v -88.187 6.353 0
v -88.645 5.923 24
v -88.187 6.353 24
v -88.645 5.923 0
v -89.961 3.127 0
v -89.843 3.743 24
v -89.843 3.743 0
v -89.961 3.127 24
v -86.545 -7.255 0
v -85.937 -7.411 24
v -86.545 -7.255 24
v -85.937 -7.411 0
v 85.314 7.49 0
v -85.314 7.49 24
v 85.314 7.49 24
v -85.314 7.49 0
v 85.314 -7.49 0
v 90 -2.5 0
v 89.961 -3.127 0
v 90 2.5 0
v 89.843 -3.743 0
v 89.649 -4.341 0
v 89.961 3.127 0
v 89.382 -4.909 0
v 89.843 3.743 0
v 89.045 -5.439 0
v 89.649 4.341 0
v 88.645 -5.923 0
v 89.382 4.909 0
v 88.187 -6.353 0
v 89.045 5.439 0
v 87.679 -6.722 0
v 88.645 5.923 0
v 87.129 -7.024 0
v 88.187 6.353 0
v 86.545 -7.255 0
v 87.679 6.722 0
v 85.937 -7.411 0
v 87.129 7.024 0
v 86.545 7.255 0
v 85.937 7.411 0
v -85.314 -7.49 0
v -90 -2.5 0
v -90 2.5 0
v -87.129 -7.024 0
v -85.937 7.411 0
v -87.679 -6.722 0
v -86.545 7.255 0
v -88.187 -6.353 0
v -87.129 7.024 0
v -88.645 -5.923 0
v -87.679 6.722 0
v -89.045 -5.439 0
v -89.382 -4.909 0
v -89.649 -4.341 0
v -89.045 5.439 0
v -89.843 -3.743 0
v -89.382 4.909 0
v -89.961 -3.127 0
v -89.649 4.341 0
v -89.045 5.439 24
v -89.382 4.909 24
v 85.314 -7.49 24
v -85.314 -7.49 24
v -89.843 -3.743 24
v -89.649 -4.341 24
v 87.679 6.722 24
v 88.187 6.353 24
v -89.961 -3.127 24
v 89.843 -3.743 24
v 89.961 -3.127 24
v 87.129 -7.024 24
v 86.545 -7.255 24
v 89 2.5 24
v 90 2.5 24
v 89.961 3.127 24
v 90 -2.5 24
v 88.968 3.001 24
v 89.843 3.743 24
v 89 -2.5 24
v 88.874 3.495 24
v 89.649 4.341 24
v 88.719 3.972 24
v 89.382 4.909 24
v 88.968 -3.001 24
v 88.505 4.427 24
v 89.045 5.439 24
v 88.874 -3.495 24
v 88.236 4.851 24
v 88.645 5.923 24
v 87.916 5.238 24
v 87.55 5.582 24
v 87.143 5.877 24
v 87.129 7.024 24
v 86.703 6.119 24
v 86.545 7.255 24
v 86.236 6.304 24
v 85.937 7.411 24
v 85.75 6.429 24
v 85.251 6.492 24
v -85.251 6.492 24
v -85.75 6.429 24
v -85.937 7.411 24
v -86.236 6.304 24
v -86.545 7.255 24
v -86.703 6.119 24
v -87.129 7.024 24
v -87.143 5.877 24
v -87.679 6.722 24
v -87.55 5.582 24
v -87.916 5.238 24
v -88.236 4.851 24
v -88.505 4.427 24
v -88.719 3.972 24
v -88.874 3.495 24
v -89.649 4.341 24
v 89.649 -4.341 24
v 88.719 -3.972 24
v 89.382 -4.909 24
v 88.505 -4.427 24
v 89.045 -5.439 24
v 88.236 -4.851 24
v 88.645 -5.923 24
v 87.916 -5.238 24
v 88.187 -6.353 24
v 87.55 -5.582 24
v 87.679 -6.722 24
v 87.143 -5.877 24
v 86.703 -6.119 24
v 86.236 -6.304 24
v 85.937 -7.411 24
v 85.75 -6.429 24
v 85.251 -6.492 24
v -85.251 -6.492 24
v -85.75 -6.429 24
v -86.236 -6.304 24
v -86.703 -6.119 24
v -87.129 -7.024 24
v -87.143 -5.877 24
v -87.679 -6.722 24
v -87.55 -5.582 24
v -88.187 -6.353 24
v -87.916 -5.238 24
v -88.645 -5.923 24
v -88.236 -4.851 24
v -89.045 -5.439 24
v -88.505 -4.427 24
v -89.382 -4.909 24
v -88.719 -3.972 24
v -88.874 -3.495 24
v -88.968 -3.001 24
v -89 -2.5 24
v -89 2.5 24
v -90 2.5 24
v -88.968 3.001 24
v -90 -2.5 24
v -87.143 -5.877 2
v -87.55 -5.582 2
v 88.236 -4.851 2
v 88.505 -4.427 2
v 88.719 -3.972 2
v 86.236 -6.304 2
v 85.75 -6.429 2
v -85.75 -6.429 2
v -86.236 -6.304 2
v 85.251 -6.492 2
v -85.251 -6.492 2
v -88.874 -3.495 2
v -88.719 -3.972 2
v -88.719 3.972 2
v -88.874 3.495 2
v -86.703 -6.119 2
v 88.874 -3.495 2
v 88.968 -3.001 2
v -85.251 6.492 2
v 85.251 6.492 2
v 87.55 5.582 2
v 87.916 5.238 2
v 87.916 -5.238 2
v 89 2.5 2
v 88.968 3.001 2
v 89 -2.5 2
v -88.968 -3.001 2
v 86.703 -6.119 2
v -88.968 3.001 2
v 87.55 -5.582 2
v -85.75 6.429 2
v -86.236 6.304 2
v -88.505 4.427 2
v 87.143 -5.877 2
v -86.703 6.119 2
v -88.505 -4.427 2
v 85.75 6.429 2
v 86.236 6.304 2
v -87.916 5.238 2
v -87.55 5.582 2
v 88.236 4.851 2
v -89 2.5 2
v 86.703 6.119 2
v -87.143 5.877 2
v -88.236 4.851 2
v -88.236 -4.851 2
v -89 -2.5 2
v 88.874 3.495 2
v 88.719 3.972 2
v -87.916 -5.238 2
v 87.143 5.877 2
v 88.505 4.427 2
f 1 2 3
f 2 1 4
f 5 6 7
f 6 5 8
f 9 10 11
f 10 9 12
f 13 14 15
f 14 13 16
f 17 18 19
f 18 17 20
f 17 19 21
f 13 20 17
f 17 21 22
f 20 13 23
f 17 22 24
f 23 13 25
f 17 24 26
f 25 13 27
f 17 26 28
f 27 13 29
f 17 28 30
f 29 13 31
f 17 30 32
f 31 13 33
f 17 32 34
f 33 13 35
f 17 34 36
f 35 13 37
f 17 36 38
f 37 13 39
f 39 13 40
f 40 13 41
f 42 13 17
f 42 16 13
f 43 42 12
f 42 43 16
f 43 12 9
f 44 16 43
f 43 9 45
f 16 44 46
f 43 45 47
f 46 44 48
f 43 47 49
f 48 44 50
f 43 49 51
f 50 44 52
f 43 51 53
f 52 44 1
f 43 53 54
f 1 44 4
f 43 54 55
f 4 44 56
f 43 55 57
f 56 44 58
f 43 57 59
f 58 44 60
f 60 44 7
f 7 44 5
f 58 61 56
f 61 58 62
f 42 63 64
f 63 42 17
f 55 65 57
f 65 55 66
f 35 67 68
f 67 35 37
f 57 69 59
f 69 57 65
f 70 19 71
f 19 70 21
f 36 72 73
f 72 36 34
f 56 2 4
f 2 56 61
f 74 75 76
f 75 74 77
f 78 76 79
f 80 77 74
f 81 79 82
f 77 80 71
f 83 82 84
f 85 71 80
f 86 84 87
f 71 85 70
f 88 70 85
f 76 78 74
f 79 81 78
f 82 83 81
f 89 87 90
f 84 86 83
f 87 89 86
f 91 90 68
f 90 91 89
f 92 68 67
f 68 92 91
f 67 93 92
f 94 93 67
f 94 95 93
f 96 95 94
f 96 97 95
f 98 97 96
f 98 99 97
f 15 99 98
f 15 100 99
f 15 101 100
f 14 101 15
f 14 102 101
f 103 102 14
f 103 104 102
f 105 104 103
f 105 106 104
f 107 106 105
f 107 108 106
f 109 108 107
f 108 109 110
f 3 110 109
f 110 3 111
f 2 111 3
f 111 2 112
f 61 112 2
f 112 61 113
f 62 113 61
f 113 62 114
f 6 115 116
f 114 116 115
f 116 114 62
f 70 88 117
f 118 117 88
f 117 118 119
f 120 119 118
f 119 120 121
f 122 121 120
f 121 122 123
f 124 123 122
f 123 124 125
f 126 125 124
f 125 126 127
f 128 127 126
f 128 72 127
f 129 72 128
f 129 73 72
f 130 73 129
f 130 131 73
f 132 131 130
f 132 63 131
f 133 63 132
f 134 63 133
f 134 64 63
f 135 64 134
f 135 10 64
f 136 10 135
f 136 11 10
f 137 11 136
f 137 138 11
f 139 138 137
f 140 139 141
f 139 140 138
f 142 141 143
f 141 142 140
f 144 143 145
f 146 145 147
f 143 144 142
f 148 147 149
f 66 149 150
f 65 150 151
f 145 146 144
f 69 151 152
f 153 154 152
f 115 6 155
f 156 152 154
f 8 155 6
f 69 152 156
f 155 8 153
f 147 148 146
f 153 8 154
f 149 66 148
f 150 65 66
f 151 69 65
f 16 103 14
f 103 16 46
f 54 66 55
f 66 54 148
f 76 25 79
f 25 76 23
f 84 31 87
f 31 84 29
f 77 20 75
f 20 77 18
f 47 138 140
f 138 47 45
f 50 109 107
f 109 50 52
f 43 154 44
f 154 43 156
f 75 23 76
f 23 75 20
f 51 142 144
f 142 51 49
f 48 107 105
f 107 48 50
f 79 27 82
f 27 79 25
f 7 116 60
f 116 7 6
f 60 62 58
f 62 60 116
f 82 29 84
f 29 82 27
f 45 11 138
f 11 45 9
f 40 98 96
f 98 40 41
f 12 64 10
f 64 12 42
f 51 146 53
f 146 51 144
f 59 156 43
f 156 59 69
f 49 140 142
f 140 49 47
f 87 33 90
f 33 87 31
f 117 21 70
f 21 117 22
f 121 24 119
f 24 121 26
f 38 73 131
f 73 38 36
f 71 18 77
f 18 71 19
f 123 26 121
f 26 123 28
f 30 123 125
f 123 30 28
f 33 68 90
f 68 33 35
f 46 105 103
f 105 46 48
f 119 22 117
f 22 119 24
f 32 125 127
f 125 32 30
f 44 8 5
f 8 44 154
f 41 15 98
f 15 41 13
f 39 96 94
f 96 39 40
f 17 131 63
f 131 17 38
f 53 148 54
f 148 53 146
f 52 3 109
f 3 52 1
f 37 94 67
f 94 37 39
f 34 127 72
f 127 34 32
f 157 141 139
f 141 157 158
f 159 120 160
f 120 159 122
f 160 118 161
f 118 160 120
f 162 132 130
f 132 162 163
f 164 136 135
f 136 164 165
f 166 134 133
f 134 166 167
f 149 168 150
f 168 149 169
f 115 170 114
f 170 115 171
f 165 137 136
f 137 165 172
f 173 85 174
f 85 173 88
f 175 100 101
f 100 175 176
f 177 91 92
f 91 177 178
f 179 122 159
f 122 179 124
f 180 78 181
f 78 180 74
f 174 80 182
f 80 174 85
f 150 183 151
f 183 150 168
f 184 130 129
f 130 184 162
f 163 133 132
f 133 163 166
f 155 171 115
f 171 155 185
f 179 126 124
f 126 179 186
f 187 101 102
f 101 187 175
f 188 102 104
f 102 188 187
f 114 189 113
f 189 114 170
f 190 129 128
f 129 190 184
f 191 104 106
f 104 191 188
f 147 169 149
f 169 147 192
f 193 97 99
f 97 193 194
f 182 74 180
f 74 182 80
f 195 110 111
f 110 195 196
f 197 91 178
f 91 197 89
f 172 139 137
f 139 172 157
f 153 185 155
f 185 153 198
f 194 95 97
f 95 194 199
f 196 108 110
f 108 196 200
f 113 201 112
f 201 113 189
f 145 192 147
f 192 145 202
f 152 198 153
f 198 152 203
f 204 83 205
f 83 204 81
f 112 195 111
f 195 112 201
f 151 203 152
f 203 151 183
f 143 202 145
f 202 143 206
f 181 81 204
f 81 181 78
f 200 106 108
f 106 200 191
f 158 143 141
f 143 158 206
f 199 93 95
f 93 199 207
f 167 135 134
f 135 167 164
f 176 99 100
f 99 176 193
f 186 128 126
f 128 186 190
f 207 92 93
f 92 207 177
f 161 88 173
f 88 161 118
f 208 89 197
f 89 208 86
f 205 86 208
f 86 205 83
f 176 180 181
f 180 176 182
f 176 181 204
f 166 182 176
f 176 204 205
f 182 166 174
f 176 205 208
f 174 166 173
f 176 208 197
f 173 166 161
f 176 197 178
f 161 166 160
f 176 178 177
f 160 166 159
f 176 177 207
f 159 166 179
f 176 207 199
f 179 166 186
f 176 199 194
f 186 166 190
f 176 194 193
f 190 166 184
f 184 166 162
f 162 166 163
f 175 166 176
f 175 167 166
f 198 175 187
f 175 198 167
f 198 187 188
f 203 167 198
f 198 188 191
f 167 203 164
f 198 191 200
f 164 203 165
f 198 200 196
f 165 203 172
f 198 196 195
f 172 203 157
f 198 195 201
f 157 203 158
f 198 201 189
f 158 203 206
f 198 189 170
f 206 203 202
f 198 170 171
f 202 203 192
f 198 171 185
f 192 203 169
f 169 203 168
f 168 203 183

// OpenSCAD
$fn = 50;


difference() {
	union() {
		hull() {
			translate(v = [-85.0000000000, 2.5000000000, 0]) {
				cylinder(h = 24, r = 5);
			}
			translate(v = [85.0000000000, 2.5000000000, 0]) {
				cylinder(h = 24, r = 5);
			}
			translate(v = [-85.0000000000, -2.5000000000, 0]) {
				cylinder(h = 24, r = 5);
			}
			translate(v = [85.0000000000, -2.5000000000, 0]) {
				cylinder(h = 24, r = 5);
			}
		}
	}
	union() {
		translate(v = [0, 0, 2]) {
			hull() {
				translate(v = [-85.0000000000, 2.5000000000, 0]) {
					cylinder(h = 22, r = 4);
				}
				translate(v = [85.0000000000, 2.5000000000, 0]) {
					cylinder(h = 22, r = 4);
				}
				translate(v = [-85.0000000000, -2.5000000000, 0]) {
					cylinder(h = 22, r = 4);
				}
				translate(v = [85.0000000000, -2.5000000000, 0]) {
					cylinder(h = 22, r = 4);
				}
			}
		}
	}
}
